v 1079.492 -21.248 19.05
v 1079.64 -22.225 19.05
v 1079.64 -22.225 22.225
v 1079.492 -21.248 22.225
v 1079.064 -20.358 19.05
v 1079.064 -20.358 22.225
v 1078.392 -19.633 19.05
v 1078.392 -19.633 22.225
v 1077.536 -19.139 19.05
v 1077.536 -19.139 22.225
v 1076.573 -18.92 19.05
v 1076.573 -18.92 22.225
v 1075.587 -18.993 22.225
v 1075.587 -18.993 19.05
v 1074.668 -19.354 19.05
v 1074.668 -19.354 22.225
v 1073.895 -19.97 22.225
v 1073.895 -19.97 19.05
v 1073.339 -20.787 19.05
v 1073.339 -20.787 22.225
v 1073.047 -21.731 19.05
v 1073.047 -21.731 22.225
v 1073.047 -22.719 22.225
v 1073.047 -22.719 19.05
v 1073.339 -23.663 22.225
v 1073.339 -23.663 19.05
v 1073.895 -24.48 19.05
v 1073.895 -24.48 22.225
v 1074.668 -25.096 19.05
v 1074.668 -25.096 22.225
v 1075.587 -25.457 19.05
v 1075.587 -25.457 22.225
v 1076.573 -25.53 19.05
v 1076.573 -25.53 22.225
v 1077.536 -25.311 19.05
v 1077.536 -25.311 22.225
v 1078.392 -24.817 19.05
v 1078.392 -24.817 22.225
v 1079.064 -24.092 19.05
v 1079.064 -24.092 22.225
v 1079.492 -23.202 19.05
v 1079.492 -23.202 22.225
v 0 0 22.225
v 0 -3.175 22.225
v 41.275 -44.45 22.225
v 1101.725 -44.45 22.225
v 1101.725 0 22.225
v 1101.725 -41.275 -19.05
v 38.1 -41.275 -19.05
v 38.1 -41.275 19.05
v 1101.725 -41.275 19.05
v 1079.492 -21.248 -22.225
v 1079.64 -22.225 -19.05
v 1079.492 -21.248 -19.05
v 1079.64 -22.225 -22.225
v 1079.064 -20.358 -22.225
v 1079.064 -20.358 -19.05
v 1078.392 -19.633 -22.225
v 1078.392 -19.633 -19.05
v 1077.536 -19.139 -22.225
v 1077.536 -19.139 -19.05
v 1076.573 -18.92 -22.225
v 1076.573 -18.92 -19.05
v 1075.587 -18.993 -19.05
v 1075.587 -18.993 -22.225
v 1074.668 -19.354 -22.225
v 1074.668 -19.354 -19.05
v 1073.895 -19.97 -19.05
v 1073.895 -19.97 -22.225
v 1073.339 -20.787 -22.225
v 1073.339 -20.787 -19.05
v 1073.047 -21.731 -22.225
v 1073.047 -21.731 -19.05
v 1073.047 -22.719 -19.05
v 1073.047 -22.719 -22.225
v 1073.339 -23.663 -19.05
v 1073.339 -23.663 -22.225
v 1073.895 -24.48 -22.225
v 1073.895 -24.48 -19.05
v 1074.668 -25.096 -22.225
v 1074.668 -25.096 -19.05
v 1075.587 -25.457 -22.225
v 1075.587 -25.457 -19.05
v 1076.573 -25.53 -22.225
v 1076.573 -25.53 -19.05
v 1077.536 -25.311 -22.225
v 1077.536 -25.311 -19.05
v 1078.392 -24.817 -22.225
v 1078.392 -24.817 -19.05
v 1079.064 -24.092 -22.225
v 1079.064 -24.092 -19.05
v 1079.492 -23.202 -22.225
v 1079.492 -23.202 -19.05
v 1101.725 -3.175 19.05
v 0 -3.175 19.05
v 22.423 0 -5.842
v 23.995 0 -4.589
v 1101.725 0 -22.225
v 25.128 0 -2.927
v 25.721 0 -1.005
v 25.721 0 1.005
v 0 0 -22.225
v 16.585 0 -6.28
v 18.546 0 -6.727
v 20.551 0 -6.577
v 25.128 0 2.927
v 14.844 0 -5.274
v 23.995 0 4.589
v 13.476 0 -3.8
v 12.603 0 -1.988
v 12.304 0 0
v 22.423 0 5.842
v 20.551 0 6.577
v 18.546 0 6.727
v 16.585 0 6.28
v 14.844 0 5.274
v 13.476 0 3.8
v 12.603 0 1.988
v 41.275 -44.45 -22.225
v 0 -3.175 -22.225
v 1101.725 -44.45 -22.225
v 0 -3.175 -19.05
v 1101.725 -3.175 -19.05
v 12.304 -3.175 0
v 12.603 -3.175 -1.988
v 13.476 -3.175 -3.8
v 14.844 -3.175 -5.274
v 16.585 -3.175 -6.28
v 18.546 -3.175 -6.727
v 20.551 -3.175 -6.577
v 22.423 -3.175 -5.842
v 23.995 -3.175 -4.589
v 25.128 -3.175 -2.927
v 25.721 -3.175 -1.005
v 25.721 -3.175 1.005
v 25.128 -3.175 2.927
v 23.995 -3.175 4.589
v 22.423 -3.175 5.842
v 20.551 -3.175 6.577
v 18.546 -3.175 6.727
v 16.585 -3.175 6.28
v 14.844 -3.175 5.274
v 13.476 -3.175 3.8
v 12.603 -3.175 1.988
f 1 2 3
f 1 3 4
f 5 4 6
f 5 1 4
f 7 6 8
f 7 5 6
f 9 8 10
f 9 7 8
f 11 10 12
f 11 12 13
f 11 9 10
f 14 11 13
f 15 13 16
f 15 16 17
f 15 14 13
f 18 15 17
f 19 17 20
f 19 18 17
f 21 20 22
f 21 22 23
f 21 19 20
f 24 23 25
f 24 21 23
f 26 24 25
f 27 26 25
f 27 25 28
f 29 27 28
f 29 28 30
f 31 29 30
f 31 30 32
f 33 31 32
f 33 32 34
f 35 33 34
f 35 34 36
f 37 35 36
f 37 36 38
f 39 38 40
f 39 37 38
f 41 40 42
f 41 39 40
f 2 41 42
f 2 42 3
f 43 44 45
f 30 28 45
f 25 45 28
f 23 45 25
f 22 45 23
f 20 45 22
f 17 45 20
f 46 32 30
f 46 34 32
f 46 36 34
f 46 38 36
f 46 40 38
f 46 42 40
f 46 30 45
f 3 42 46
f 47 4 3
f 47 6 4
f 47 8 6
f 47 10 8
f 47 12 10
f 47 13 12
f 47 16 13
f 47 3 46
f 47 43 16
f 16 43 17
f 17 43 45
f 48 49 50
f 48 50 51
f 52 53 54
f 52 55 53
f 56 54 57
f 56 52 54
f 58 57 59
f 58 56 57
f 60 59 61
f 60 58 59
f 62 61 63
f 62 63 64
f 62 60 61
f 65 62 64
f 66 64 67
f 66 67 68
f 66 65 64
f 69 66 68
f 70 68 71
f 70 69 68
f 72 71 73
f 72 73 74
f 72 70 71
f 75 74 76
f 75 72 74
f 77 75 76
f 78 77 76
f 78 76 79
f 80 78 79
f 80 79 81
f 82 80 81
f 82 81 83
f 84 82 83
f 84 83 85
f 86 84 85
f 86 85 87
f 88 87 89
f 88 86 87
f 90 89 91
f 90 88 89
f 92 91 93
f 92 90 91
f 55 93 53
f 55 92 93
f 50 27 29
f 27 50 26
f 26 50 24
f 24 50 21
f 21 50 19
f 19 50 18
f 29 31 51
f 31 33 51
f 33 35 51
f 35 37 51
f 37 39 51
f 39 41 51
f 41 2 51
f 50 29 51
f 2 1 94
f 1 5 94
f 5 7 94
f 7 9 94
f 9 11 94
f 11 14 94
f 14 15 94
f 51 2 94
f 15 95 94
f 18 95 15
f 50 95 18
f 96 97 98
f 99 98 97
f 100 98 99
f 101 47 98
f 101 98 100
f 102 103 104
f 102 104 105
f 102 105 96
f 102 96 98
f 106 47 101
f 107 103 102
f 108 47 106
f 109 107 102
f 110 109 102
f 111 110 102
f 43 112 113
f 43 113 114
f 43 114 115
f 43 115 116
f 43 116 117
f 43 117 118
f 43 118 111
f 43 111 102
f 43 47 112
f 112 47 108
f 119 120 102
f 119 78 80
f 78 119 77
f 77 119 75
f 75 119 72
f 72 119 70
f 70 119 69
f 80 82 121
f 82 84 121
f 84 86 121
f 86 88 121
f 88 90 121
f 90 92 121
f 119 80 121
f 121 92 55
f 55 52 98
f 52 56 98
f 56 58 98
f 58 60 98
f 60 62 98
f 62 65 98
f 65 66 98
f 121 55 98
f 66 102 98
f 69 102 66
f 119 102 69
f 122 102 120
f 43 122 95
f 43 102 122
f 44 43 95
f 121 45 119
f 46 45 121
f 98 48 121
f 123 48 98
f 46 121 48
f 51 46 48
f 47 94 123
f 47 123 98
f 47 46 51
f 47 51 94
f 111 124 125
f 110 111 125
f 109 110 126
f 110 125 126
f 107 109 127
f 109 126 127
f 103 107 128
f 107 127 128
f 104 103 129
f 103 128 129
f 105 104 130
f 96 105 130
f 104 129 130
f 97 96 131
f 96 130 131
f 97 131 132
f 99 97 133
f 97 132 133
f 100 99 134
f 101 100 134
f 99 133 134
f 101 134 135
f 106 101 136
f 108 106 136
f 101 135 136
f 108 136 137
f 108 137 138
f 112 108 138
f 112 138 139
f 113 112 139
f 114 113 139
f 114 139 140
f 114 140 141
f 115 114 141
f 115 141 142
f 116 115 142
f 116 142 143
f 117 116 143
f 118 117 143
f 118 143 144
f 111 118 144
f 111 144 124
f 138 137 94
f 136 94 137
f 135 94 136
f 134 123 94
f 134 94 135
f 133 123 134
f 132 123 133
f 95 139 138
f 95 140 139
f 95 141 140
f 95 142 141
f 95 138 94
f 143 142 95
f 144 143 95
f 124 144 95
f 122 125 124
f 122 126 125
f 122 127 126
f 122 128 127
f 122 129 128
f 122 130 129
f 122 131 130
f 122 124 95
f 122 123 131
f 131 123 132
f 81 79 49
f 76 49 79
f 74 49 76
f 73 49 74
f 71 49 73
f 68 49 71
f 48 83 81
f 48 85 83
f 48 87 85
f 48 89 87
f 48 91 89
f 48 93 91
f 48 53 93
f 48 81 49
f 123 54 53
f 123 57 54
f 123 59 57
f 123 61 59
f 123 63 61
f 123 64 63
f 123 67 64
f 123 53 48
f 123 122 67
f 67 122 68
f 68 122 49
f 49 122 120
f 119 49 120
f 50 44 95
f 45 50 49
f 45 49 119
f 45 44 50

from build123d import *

# Parameters (mm, degrees)
SKETCH1_R               = 3.3147
BOSS_EXTRUDE1_DEPTH     = 22.225
SHELL1_START            = -19.05
SHELL1_OUTLINE_R        = 3.3147
SHELL1_DEPTH            = 38.1
F_1_2_CLEARANCE_HOLE1_D = 13.49248


# Read off the part's stored shape, not the designer's step: Shell1
with BuildPart() as part:
    # Sketch1 → Boss-Extrude1 (new, symmetric)
    with BuildSketch(Plane.XY):
        Polygon((41.275, -44.45), (1101.725, -44.45), (1101.725, 0), (0, 0), (0, -3.175), align=None)
        with Locations((1076.325, -22.225)):
            Circle(SKETCH1_R, mode=Mode.SUBTRACT)
    extrude(amount=BOSS_EXTRUDE1_DEPTH, both=True)

    # Shell1 outline → Shell1 (cut)
    with BuildSketch(Plane.XY.offset(SHELL1_START)):
        Polygon((38.1, -41.275), (1101.725, -41.275), (1101.725, -3.175), (0, -3.175), align=None)
        with Locations((1076.325, -22.225)):
            Circle(SHELL1_OUTLINE_R, mode=Mode.SUBTRACT)
    extrude(amount=SHELL1_DEPTH, mode=Mode.SUBTRACT)

    # 1/2 Clearance Hole1 (through all)
    with Locations(Plane(origin=(0, 0, 0), x_dir=(1, 0, 0), z_dir=(0, 1, 0))):
        with Locations((19.05, 0)):
            Hole(F_1_2_CLEARANCE_HOLE1_D / 2)


solid = part.part
